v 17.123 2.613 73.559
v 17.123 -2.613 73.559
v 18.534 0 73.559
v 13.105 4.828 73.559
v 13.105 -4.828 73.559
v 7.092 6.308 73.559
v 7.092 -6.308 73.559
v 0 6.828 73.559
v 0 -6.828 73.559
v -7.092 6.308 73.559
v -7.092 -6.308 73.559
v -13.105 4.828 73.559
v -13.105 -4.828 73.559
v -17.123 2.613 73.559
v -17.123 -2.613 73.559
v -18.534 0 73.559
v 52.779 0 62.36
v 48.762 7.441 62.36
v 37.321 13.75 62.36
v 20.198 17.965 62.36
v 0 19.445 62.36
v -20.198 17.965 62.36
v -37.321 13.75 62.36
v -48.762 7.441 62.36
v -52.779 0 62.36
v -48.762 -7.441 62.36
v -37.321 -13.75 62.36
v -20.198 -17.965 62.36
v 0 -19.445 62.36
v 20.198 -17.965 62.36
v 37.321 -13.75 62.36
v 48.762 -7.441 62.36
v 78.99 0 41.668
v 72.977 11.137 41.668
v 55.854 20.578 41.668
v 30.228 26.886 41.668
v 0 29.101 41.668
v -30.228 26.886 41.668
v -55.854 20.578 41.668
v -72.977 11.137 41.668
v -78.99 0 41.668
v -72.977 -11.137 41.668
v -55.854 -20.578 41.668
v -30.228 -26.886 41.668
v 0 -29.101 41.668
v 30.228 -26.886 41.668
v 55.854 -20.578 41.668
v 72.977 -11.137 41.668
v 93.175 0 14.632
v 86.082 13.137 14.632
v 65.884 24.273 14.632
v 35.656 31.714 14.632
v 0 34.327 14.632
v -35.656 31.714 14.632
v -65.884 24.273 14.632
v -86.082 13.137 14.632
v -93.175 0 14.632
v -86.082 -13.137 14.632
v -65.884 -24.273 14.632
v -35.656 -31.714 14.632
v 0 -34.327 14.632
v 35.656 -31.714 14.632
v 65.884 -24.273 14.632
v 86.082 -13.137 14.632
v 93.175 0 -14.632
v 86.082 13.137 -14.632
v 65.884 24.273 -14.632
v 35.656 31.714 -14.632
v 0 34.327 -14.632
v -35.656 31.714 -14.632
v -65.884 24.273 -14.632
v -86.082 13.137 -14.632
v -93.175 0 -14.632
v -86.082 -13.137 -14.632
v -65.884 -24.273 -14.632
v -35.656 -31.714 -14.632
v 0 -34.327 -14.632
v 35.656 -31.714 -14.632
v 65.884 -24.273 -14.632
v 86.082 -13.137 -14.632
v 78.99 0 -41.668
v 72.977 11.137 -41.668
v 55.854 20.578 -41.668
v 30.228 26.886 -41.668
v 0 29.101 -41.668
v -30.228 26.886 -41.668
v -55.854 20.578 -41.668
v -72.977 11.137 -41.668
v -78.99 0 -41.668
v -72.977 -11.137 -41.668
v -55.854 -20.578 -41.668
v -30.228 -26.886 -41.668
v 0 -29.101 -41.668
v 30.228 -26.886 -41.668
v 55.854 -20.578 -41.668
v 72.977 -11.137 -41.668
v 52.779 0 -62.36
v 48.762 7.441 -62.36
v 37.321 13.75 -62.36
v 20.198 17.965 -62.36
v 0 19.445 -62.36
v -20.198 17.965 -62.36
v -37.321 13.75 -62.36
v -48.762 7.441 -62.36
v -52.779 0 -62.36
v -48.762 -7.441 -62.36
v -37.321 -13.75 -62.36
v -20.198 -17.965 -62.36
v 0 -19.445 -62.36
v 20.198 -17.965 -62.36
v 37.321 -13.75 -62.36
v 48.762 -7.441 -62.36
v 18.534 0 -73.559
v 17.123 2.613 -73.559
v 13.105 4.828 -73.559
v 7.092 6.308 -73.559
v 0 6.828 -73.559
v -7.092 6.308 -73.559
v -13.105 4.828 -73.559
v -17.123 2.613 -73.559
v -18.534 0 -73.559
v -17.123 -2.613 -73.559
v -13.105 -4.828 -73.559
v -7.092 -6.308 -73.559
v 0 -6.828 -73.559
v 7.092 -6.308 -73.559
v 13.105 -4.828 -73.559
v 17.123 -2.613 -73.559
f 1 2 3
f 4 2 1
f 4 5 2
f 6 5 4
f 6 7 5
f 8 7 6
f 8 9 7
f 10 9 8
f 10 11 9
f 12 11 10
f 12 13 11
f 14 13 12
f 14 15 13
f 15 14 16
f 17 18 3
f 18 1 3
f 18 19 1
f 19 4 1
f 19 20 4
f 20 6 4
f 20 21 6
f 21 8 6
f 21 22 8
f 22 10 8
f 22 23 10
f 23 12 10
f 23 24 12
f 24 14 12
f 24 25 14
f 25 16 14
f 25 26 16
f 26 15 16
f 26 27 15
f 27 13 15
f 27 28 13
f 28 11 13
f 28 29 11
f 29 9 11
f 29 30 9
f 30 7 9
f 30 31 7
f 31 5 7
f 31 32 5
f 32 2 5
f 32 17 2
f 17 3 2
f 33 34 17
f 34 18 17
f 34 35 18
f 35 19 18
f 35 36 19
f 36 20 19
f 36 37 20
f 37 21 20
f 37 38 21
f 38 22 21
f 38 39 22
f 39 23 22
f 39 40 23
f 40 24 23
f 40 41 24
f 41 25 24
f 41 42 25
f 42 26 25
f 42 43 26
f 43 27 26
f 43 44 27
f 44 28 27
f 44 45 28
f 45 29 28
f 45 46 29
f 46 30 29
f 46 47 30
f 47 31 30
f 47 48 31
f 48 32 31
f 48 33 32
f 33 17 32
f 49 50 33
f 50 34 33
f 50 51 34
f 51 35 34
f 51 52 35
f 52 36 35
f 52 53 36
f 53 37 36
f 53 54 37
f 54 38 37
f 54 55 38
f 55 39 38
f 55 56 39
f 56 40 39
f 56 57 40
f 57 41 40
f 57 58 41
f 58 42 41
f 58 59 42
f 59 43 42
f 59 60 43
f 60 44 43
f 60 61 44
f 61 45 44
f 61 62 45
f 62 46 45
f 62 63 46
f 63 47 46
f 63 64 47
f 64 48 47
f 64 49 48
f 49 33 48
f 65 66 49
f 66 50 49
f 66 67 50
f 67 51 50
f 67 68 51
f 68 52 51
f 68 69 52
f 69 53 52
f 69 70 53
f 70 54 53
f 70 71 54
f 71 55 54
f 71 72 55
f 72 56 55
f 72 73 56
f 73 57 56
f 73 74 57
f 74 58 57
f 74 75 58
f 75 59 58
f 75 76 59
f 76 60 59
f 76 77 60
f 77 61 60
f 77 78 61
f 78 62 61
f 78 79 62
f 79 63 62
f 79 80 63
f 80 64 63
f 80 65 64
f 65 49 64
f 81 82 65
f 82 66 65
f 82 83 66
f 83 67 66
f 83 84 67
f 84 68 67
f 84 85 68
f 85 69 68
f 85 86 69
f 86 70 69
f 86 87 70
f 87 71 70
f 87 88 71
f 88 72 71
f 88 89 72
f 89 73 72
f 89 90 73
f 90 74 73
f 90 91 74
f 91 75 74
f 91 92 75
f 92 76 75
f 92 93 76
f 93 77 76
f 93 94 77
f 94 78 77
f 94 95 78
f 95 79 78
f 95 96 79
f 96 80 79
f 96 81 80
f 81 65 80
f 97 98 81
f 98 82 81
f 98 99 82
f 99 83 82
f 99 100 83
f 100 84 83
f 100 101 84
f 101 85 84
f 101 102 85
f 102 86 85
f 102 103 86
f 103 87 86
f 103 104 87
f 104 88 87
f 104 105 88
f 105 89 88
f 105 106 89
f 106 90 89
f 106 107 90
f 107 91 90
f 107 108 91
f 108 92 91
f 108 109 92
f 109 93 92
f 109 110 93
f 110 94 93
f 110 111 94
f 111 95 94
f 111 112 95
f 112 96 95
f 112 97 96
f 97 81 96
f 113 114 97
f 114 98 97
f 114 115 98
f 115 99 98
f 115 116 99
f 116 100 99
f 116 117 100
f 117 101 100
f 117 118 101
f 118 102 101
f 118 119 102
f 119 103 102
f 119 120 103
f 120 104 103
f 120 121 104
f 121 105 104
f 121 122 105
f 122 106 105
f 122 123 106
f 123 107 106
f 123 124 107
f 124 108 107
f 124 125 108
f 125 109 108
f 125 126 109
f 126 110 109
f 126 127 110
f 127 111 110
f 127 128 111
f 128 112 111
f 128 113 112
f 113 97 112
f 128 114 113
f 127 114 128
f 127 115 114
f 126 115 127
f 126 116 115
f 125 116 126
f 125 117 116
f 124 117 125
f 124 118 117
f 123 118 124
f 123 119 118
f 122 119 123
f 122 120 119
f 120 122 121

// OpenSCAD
// Generated by SolidPython 1.0.1 on 2020-07-29 00:46:53


scale(v = [19, 7, 15]) {
	sphere(r = 5);
}
/***********************************************
*********      SolidPython code:      **********
************************************************
 
# import packages: SolidPython
from solid import *
from solid.utils import *
from itertools import chain, combinations, permutations


class Resize:

    def __init__(self, scad_file):
        self.scad_file = scad_file
        #self.scad_file = import_scad(scad_file)
        # cone/cylinder param:
        self.r1 = 0
        self.r2 = 0
        self.h = 0
        # rectangular prism param:
        self.w = 0
        self.l = 0
        # ellipse param:
        self.r = 0

    # import OpenScad code (file name corresponds to shape)


    # classify shape + parameters
    def assign(self, param1, param2, param3):
        if self.scad_file == 'cone.scad':
            self.r1 = param1
            self.r2 = param2
            self.h = param3
        elif self.scad_file == 'cylinder.scad':
            self.r1 = param1
            self.r2 = param2
            self.h = param3
        elif self.scad_file == 'rectangularPrism.scad':
            self.h = param1
            self.l = param2
            self.w = param3
        else:
            self.r = param1
            self.h = param2

    # resize parameters
    def iterate(self):
        x = range(3, 20, 2)
        i = 1
        if self.scad_file == 'cone.scad':
            tempList = list(permutations(x, 2))
            for temp in tempList:
                param1 = temp[0]
                param2 = temp[1]
                filepath = 'produced_scad_files/' + 'cone' + str(param1) + '_' + str(param2) + '_' + '.scad'
                scad_render_to_file(cylinder(h=param1, r1=param2, r2=0), filepath)

        elif self.scad_file == 'cylinder.scad':
            tempList = list(permutations(x, 3))
            for temp in tempList:
                param1 = temp[0]
                param2 = temp[1]
                filepath = 'produced_scad_files/' + 'cylinder' + str(param1) + '_' + str(param2) + '_' + '.scad'
                scad_render_to_file(cylinder(h=param1, r1=param2, r2=param2), filepath)

        elif self.scad_file == 'rectangularPrism.scad':
            tempList = list(permutations(x, 3))
            for temp in tempList:
                param1 = temp[0]
                param2 = temp[1]
                param3 = temp[2]
                filepath = 'produced_scad_files/' + 'rectangularPrism' + str(param1) + '_' + str(param2) + '_' + str(
                    param3) + '.scad'
                scad_render_to_file(cube(size=(param1, param2, param3)), filepath)

        elif self.scad_file == 'ellipse.scad':
            tempList = list(permutations(x, 4))
            for temp in tempList:
                param1 = temp[0]
                param2 = temp[1]
                param3 = temp[2]
                param4 = temp[3]
                filepath = 'produced_scad_files/' + 'ellipse' + str(param1) + '_' + str(param2) + '_' + str(param3) + '_' + str(param4) + '.scad'
                scad_render_to_file(scale([param1, param2, param3])(sphere(r=param4)), filepath)

    def render_to_scadfile(self):
        scad_render_to_file(scad, 'example.scad') 
 
************************************************/
